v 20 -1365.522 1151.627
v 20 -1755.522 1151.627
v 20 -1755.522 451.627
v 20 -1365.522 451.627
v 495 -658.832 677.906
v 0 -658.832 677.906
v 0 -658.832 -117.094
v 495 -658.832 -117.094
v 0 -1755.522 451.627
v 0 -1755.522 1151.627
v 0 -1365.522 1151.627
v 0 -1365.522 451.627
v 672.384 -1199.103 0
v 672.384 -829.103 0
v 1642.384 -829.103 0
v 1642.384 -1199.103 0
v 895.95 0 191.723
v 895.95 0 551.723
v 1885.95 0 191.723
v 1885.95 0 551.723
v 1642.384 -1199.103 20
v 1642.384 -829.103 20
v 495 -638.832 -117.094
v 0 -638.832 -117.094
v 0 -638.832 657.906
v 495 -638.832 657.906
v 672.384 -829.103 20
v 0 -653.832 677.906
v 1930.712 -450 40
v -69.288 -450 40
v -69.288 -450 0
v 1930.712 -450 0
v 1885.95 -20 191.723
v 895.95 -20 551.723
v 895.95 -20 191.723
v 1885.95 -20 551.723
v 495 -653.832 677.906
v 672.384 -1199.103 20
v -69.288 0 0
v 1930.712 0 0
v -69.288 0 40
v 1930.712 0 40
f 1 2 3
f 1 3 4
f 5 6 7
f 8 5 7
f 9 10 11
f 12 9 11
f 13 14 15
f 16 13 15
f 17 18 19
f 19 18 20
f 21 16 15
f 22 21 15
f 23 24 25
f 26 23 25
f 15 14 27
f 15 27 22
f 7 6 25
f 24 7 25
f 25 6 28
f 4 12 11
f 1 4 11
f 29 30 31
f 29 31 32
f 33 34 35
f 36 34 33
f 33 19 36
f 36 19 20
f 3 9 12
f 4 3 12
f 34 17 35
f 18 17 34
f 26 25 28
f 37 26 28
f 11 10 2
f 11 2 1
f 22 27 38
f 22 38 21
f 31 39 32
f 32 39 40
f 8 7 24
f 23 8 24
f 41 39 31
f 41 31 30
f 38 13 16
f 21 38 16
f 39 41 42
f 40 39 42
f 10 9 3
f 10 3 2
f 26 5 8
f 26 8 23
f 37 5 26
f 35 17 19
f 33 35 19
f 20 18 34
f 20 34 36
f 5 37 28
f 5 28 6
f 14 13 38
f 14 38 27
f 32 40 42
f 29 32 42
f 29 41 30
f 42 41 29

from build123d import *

# Parameters (mm, degrees)
F0_W     = 2000
F0_H     = 40
F1_DEPTH = 450
F3_DEPTH = 495
F4_W     = 990
F4_H     = 360
F5_DEPTH = 20
F6_W     = 390
F6_H     = 700
F7_DEPTH = 20
F8_W     = 970
F8_H     = 370
F9_DEPTH = 20


with BuildPart() as f1:
    # F0 (on Front) → F1 (new body)
    with BuildSketch(Plane.XZ):
        with Locations((930.711687, 20)):
            Rectangle(F0_W, F0_H)
    extrude(amount=F1_DEPTH)


with BuildPart() as f3:
    # F2 (on Right) → F3 (new body)
    with BuildSketch(Plane.YZ):
        Polygon((-653.831805, 677.905893), (-658.831805, 677.905893), (-658.831805, -117.094107), (-638.831805, -117.094107), (-638.831805, 657.905893), align=None)
    extrude(amount=F3_DEPTH)


with BuildPart() as f5:
    # F4 (on Front) → F5 (new body)
    with BuildSketch(Plane.XZ):
        with Locations((1390.94996, 371.722646)):
            Rectangle(F4_W, F4_H)
    extrude(amount=F5_DEPTH)


with BuildPart() as f7:
    # F6 (on Right) → F7 (new body)
    with BuildSketch(Plane.YZ):
        with Locations((-1560.52237, 801.627493)):
            Rectangle(F6_W, F6_H)
    extrude(amount=F7_DEPTH)


with BuildPart() as f9:
    # F8 (on Top) → F9 (new body)
    with BuildSketch(Plane.XY):
        with Locations((1157.383695, -1014.102879)):
            Rectangle(F8_W, F8_H)
    extrude(amount=F9_DEPTH)


solid = Compound([f1.part, f3.part, f5.part, f7.part, f9.part])
